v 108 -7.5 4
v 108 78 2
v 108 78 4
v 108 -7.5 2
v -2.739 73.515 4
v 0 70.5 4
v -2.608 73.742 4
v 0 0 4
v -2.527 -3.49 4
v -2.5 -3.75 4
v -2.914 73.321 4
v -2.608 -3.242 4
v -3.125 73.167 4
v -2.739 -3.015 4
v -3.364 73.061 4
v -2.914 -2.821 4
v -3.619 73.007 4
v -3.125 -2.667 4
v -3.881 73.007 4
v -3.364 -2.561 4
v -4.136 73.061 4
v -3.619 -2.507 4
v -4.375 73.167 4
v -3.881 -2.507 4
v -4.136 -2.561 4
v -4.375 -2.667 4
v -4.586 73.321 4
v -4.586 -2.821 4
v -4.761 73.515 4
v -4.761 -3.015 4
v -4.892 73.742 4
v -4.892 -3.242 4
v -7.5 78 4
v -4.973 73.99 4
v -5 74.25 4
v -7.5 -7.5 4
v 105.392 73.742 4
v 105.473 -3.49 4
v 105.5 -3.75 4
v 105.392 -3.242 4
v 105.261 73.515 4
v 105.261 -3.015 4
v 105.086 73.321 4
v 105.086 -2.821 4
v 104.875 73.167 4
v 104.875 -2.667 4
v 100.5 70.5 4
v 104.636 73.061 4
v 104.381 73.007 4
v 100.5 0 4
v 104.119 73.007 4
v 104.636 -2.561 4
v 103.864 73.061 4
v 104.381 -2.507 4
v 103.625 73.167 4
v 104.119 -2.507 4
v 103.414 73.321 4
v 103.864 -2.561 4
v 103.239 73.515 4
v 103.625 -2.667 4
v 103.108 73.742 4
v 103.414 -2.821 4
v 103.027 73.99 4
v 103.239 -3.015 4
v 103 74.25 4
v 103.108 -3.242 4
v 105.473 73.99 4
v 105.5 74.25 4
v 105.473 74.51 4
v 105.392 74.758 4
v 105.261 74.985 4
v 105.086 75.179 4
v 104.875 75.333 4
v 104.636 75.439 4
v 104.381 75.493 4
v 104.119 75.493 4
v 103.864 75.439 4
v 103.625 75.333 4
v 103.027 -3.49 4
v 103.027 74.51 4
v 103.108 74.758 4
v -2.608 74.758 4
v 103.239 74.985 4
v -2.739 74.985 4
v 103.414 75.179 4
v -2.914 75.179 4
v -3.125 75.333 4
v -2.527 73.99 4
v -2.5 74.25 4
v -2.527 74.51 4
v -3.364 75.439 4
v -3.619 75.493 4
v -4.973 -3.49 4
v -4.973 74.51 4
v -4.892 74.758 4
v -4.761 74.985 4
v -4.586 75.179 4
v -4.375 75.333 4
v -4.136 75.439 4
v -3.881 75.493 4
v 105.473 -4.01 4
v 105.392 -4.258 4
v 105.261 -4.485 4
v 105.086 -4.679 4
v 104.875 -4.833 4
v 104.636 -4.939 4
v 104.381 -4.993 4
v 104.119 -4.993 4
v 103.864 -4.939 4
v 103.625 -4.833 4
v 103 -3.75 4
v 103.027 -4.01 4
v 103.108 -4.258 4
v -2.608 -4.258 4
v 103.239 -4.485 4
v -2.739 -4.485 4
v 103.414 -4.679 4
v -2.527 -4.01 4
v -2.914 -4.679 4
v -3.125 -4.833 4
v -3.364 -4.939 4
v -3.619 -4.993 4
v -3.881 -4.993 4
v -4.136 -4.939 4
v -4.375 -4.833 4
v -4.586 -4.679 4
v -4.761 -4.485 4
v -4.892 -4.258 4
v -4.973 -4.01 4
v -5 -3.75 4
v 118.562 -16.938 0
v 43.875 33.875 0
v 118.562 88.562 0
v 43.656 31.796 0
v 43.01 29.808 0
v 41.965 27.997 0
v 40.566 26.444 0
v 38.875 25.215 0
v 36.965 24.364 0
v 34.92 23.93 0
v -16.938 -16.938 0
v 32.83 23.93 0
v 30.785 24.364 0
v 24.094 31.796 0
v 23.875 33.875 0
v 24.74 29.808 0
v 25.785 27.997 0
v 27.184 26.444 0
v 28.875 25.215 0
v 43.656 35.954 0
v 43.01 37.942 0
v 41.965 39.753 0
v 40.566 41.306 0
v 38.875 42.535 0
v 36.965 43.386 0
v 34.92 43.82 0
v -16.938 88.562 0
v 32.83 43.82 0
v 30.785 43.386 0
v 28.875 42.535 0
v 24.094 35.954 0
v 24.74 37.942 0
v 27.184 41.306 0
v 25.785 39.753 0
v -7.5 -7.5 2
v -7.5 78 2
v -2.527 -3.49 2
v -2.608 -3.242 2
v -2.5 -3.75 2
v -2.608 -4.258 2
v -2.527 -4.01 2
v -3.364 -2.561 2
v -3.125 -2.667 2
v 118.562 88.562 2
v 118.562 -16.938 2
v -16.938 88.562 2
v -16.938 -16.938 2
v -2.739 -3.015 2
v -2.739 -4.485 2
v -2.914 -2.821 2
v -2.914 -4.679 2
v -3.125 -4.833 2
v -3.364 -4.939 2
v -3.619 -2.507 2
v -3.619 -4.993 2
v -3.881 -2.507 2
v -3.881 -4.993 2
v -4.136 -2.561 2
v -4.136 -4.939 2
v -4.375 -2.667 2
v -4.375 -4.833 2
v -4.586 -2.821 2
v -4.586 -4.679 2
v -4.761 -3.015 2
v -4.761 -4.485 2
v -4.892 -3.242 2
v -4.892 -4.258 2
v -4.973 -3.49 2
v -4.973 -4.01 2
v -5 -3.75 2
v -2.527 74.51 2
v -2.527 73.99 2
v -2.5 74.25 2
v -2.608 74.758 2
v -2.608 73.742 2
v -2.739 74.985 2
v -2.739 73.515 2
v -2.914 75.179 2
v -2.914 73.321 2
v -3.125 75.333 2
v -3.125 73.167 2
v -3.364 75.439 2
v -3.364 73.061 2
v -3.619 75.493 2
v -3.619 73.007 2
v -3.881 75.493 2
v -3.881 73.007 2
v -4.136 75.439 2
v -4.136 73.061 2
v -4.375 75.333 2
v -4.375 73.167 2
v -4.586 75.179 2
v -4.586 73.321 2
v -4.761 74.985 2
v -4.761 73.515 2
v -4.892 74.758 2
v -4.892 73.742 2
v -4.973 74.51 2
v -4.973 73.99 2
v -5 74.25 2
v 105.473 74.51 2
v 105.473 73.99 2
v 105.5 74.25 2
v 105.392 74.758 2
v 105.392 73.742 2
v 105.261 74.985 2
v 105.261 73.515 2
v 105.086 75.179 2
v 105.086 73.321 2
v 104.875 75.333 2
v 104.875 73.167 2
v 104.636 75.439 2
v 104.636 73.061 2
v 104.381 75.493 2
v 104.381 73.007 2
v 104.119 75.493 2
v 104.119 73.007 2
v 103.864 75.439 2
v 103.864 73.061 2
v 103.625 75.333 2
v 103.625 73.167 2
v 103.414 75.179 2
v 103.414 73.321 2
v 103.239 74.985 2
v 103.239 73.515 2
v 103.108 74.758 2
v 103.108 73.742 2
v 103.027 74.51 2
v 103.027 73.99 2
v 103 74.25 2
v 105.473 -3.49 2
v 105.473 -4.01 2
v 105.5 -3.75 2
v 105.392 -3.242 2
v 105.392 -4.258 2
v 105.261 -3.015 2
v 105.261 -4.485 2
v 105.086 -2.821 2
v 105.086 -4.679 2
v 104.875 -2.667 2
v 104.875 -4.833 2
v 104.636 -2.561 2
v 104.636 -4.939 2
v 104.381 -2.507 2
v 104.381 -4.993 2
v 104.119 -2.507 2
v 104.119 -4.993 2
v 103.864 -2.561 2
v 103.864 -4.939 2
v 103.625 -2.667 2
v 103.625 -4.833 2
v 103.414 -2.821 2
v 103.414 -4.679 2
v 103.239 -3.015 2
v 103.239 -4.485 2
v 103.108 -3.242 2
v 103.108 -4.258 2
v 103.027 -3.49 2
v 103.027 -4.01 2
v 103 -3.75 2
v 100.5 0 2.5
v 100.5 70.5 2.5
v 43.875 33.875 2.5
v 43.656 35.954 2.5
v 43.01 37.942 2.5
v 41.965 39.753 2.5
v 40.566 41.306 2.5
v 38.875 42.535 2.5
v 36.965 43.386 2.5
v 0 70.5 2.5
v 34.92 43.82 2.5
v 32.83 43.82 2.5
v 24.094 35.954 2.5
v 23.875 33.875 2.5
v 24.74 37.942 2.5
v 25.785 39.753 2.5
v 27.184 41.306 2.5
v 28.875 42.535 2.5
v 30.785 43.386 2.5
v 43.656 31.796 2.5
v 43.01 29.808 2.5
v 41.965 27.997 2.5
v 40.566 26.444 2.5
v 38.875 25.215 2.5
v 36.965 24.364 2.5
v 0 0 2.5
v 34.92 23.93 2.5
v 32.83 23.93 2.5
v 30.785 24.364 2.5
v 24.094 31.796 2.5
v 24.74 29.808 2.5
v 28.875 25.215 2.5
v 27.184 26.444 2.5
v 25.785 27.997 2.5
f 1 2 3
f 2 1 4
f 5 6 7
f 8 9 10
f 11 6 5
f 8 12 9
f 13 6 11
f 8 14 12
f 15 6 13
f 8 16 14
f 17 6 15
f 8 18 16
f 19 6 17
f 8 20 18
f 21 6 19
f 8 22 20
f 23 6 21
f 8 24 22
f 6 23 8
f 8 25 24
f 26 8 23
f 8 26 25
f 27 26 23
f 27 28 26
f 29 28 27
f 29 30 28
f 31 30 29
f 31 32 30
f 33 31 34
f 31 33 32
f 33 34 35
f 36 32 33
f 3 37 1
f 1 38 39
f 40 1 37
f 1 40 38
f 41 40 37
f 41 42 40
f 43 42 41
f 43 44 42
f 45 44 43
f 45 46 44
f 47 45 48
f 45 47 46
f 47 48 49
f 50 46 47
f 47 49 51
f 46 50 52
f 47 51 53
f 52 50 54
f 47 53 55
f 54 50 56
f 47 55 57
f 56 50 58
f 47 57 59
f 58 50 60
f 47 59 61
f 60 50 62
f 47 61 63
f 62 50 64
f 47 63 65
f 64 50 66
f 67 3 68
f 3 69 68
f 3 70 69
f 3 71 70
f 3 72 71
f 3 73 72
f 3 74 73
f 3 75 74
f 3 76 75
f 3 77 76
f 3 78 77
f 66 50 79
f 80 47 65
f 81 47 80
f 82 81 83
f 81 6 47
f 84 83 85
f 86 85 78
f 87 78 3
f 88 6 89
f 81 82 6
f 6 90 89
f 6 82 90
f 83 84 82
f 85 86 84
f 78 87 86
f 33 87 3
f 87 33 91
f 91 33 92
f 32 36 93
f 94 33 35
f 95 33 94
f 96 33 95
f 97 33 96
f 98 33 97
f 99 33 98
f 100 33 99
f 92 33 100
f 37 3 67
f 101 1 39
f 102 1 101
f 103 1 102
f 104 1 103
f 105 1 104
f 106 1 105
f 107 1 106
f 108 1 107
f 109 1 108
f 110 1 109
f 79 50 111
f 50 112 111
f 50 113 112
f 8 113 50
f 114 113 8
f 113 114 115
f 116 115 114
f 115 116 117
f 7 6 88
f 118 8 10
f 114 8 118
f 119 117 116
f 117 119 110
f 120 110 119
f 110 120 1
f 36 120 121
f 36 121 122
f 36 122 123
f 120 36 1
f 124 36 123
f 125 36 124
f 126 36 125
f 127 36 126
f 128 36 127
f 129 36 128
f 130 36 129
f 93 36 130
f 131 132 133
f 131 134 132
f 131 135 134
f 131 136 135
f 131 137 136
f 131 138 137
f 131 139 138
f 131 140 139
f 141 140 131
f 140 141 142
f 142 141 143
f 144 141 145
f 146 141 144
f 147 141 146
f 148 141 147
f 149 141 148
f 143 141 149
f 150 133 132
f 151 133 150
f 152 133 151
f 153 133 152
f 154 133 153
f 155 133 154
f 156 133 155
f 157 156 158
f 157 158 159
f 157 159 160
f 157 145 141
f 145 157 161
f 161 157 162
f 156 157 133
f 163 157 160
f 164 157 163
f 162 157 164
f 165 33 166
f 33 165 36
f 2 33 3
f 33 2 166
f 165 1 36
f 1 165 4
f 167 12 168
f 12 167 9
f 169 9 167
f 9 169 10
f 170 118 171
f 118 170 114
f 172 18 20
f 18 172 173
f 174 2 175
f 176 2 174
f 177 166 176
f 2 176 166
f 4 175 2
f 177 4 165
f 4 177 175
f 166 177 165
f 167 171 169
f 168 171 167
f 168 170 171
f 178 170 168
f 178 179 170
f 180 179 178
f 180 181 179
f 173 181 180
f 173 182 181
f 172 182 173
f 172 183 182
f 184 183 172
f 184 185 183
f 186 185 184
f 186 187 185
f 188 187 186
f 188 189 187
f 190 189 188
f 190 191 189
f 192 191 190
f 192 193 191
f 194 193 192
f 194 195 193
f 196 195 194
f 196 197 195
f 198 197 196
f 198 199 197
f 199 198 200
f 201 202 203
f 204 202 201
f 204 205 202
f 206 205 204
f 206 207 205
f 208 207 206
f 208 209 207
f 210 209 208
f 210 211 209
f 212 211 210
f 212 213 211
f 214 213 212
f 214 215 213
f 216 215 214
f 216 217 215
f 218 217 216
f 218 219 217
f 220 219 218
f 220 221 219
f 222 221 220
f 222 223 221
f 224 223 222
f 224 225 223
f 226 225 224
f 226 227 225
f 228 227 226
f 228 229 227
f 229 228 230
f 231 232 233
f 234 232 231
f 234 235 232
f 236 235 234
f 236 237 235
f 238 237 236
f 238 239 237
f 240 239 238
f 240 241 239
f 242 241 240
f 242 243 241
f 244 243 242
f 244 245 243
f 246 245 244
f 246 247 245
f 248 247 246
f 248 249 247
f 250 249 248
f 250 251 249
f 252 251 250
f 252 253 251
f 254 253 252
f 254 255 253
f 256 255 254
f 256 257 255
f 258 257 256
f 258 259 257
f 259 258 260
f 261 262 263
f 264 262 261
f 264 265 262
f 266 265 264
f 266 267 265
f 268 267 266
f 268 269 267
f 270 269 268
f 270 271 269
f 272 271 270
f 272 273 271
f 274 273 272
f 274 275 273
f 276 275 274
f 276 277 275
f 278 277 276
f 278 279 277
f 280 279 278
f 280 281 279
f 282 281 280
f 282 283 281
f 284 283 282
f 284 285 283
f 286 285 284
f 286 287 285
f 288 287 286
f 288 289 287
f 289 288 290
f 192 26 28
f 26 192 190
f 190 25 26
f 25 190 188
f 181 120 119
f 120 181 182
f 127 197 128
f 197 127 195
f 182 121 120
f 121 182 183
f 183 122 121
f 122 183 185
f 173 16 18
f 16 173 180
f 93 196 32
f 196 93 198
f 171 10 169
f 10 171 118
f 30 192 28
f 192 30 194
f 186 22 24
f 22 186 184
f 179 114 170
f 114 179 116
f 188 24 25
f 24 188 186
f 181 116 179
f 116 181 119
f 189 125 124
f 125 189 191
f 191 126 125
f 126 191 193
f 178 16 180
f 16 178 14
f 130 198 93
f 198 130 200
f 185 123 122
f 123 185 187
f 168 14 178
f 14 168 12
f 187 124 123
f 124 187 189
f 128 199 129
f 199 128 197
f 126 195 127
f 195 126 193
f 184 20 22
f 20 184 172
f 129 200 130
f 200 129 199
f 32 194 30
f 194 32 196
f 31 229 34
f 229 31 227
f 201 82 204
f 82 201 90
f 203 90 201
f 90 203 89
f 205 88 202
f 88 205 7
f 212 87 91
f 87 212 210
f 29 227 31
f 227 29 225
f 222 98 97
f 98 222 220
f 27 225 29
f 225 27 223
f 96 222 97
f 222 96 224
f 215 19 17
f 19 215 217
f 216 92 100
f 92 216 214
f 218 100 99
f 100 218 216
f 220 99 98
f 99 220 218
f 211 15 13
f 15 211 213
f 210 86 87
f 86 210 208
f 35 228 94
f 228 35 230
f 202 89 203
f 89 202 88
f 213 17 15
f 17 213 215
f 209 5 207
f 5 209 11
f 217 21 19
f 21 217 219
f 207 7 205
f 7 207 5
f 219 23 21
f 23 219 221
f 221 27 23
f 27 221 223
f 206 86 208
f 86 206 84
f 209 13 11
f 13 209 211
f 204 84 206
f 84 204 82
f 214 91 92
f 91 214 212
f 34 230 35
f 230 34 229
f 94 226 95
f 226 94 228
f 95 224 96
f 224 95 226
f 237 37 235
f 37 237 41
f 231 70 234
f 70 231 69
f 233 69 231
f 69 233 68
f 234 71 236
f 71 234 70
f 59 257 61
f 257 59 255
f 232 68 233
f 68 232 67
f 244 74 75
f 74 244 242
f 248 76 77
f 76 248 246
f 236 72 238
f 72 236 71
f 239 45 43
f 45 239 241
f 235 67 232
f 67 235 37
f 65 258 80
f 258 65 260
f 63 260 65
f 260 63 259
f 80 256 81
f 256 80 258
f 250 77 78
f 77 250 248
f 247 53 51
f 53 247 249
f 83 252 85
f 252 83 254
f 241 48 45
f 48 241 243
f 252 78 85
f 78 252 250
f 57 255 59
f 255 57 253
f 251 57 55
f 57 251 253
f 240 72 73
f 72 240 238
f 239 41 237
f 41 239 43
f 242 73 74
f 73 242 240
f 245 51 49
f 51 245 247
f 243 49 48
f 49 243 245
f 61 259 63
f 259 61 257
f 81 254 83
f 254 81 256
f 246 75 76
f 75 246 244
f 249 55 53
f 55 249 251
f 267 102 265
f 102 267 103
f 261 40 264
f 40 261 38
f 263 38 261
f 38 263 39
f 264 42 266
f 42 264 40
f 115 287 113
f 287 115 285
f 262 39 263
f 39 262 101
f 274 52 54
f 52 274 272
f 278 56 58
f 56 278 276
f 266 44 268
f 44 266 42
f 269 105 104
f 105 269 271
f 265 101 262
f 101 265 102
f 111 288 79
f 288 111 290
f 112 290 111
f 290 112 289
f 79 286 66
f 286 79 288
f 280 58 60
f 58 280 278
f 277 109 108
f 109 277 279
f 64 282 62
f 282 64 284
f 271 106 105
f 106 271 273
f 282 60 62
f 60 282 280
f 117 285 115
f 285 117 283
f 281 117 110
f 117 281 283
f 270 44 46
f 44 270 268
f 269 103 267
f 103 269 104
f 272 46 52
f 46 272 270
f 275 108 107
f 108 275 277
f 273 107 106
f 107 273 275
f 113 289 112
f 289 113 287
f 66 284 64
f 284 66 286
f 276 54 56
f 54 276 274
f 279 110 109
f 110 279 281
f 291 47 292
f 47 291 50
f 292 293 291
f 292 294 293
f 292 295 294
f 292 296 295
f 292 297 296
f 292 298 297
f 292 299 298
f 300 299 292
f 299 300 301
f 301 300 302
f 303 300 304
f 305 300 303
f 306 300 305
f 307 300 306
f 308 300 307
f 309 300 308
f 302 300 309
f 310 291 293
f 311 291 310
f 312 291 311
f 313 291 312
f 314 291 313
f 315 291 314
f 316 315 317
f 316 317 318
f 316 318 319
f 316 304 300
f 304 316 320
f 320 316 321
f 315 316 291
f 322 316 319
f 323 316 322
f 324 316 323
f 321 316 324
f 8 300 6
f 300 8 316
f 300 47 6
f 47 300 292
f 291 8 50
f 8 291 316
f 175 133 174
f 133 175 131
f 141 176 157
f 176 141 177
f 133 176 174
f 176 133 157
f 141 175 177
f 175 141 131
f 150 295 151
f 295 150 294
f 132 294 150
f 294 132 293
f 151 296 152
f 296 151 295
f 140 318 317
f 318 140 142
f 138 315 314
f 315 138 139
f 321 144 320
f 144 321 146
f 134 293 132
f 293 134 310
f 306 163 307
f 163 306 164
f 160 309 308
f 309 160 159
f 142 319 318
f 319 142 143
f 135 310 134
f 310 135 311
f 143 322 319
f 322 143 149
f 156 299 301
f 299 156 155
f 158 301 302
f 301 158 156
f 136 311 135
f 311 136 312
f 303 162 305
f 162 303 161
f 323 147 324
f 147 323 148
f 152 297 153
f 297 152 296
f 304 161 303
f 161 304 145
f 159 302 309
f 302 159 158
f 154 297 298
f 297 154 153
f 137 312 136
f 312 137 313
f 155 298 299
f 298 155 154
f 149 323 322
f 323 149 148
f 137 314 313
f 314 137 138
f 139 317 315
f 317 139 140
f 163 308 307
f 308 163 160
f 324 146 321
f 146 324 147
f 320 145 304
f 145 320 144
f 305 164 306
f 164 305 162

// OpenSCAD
$fn=30;
board_x = 100.5;
board_y = 70.5;
board_z = 1.5;

flat_lip_size = 10;

screw_dia = 2.5;

edge_thickness = 15;

item_height = 4;

combi_x = board_x + edge_thickness+(flat_lip_size*2);
combi_y = board_y + edge_thickness+(flat_lip_size*2);
field_thickness = 2;


module exterior()
{
    difference()
    {
    translate([-edge_thickness/2,-edge_thickness/2,0]) cube([board_x+edge_thickness,board_y+edge_thickness,item_height]);
        
    translate([-edge_thickness/4, -edge_thickness/4,item_height-(item_height/2)]) cylinder(r=screw_dia/2, h=item_height/2);
        
    translate([-edge_thickness/4, ((-edge_thickness/4)+board_y+edge_thickness/2),item_height-(item_height/2)]) cylinder(r=screw_dia/2, h=item_height/2);
        
    translate([
        (-edge_thickness/4)+board_x+edge_thickness/2,
        ((-edge_thickness/4)+board_y+edge_thickness/2),
        (item_height-(item_height/2))
        ]) 
            cylinder(r=screw_dia/2, h=item_height/2);
    translate([
        ((-edge_thickness/4)+board_x+edge_thickness/2),
        ((-edge_thickness/4)),
        (item_height-(item_height/2))
        ])
         
            cylinder(r=screw_dia/2, h=item_height/2);

    }

}

module pcb()
{
    color([1,0,0]) translate([0,0,item_height-board_z]) cube([board_x, board_y, board_z]);
}

module field()
{
    cube([combi_x,combi_y,field_thickness]);
}


module holder()
{
    union() {
    difference() {
        exterior();
        pcb();
    }
    translate([-combi_x/8,-combi_x/8])field();
}
}

module plus_fingerhole() {
    difference()
    {
        holder();
        translate([combi_x/4,combi_x/4,0])cylinder(r=10, h=10);
    }
}
plus_fingerhole();


